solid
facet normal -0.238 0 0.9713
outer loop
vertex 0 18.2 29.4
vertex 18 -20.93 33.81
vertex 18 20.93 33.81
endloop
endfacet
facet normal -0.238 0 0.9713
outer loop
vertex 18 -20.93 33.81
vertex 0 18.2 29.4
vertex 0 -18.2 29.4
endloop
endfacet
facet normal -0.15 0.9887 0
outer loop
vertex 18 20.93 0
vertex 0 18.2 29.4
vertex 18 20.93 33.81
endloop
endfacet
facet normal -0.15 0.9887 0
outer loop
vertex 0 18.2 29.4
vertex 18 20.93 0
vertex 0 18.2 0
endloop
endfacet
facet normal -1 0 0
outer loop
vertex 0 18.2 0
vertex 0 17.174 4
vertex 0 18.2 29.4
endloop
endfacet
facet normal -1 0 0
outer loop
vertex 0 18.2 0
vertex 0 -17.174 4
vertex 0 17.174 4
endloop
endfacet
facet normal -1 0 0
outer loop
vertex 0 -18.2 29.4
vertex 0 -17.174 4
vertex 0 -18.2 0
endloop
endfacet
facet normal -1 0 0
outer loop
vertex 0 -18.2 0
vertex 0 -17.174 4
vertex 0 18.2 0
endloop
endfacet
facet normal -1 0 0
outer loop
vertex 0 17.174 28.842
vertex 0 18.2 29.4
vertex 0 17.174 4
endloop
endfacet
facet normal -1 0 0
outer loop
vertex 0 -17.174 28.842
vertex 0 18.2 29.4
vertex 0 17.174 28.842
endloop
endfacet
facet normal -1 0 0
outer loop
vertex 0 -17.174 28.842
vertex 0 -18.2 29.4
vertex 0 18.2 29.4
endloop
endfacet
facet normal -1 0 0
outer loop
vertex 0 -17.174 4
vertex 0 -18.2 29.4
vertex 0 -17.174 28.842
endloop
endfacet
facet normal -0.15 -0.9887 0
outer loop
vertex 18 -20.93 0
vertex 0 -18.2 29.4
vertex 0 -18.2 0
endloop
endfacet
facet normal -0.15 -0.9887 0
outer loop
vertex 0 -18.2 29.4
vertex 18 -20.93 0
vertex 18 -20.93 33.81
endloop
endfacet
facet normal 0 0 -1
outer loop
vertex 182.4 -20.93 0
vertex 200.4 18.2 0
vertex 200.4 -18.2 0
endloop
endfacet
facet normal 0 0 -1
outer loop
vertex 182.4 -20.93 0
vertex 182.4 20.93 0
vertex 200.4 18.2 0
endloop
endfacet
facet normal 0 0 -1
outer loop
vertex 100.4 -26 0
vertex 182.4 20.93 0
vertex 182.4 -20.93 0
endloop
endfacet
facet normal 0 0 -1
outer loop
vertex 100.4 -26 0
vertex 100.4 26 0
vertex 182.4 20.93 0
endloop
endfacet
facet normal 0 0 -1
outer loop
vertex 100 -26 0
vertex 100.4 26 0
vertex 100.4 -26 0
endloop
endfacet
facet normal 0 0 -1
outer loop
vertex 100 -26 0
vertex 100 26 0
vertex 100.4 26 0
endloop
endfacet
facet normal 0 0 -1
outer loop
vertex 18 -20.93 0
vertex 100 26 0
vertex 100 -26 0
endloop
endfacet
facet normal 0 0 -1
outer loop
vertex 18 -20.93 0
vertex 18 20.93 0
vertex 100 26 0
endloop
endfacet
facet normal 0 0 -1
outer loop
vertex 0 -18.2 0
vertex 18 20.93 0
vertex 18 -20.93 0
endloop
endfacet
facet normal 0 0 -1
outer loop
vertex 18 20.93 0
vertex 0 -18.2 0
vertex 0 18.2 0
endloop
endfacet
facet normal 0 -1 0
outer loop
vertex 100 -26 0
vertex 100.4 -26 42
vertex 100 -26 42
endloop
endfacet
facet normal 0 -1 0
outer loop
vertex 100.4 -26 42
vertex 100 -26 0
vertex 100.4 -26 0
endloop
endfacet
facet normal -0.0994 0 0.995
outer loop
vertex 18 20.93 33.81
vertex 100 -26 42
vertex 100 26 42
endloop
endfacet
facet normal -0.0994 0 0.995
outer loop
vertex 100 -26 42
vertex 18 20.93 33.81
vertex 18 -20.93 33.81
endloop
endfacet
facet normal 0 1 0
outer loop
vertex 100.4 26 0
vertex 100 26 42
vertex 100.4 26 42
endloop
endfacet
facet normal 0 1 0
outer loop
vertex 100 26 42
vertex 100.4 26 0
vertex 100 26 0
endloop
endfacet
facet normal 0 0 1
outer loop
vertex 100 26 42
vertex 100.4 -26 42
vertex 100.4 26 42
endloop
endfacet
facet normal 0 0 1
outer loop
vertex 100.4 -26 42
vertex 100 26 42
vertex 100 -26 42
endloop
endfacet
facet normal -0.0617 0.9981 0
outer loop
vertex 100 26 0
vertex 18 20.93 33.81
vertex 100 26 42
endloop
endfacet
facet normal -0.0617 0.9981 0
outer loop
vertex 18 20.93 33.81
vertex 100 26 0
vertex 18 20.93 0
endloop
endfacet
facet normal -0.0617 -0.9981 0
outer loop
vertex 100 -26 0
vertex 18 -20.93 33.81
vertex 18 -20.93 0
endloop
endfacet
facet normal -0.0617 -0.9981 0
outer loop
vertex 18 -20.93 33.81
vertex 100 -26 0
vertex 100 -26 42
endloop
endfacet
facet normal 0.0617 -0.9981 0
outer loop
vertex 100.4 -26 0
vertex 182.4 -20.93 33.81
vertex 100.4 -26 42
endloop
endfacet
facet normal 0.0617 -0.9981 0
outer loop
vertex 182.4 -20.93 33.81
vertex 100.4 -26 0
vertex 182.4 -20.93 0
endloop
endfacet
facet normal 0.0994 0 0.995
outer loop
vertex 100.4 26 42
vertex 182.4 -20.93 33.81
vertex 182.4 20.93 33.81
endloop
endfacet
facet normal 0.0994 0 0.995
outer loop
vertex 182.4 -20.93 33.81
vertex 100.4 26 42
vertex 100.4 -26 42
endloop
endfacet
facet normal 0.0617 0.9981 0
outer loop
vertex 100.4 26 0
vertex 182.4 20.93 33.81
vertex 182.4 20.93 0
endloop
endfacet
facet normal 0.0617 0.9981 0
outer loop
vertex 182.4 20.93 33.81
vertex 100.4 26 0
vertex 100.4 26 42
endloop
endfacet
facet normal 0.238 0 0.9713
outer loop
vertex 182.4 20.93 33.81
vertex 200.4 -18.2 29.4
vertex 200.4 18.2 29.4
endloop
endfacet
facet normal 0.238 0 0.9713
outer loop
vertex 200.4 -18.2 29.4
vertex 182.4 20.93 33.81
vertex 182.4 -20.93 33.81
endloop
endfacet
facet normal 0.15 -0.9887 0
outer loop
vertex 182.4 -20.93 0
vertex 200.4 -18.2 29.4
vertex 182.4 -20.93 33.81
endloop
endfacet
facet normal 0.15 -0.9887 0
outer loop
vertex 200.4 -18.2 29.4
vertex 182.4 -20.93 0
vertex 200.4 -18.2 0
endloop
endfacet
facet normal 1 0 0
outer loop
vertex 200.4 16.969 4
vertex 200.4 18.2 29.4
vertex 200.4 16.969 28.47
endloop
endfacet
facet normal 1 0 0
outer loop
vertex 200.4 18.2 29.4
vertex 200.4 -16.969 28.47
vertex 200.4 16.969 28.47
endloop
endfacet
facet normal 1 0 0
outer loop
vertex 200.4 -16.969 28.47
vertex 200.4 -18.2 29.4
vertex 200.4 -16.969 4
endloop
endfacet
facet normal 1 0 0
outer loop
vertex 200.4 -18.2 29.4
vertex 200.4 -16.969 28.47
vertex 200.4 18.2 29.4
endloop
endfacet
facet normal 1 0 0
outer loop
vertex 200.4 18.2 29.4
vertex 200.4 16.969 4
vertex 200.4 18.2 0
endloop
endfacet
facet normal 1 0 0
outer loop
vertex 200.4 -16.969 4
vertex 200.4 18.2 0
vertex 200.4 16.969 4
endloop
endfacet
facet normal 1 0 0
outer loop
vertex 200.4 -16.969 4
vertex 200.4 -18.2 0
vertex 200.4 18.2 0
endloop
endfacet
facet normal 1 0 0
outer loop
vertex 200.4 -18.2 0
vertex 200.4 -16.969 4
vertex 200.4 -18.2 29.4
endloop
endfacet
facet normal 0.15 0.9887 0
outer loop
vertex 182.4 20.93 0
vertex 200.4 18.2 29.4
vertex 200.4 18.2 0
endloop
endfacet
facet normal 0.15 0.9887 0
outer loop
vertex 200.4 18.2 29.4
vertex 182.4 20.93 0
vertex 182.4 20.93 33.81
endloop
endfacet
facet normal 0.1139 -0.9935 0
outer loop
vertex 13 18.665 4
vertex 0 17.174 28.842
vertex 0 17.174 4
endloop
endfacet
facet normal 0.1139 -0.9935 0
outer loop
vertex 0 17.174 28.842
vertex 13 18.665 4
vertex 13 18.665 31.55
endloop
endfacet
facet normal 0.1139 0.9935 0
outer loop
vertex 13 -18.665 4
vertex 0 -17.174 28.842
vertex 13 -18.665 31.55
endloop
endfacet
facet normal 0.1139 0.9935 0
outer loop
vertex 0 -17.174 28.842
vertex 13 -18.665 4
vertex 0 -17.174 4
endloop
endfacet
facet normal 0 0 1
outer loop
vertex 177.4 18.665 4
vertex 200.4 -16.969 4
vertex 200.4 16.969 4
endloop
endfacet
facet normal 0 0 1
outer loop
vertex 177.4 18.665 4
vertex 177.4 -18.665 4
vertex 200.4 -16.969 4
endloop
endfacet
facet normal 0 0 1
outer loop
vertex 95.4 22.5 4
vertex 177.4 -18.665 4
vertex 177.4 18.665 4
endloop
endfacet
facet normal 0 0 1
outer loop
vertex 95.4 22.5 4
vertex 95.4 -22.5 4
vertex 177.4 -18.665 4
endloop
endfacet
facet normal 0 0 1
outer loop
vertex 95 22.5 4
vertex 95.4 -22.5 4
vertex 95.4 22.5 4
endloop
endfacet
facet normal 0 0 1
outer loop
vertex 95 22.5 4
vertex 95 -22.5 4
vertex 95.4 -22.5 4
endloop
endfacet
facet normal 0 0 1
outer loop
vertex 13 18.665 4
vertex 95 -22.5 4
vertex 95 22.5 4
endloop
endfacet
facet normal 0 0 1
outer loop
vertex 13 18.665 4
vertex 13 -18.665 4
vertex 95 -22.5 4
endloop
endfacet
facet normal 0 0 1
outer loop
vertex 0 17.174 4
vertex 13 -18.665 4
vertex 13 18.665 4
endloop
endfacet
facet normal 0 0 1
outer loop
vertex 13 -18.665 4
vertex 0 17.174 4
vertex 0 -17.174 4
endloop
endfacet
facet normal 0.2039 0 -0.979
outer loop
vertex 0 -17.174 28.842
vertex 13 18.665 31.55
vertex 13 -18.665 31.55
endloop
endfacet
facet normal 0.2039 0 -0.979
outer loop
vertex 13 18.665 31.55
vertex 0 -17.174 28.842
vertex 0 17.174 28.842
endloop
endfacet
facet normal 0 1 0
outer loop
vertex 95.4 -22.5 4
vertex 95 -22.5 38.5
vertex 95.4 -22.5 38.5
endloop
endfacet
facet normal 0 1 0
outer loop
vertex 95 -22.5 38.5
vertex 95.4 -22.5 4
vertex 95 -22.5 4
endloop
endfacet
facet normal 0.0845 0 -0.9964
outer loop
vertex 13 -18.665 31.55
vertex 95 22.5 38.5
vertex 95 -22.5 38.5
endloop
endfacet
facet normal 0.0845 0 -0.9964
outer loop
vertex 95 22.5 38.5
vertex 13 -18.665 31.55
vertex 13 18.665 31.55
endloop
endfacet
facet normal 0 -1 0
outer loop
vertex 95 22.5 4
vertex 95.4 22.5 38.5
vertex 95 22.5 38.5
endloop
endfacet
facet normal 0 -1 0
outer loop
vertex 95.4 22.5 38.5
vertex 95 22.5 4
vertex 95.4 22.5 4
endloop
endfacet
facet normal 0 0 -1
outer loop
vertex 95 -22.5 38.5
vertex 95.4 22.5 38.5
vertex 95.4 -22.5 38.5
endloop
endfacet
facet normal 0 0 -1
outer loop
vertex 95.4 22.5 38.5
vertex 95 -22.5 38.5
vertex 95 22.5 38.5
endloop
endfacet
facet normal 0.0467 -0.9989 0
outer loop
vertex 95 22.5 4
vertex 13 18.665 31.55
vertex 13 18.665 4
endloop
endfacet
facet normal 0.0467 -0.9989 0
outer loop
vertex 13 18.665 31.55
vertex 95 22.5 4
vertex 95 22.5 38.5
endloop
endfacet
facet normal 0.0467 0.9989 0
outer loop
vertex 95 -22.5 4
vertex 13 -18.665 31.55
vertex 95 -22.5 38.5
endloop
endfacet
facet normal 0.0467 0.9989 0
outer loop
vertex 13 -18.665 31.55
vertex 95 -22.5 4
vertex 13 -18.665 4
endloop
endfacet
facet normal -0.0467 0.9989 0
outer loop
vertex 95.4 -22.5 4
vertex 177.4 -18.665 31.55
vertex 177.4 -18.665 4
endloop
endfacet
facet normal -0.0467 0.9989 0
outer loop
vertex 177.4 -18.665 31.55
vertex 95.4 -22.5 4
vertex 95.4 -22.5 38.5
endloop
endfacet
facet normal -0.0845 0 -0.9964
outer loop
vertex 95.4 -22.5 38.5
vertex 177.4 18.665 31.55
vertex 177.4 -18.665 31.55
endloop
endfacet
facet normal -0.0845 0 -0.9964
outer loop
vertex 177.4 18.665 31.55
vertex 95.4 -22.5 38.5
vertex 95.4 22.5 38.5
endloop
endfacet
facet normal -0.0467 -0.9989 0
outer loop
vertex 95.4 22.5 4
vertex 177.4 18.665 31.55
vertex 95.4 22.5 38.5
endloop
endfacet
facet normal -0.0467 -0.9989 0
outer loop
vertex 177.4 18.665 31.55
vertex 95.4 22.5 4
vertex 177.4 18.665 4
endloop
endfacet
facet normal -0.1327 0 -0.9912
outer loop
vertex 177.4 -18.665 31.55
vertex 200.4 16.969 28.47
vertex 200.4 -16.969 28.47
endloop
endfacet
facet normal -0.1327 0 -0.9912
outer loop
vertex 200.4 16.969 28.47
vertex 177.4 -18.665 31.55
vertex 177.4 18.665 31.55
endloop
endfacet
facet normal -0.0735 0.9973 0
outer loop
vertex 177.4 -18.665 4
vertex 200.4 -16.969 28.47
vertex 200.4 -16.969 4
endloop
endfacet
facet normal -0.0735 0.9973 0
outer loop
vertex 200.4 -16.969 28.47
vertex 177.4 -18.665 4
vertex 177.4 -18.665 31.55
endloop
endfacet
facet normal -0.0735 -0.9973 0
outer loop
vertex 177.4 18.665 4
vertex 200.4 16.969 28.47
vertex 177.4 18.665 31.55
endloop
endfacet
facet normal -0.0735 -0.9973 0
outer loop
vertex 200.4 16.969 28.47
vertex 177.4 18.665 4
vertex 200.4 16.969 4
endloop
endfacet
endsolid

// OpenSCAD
$fn = 32;

// ----------------------------------------------------------------------
// Faired channel: 200 x 52 x 42 mm, 3.5 mm walls, faired ends
// ----------------------------------------------------------------------

// --- parameters (mm) ---
length = 200;             // channel length
width = 52;               // channel width at mid length
height = 42;              // channel height at mid length
wall = 3.5;               // side wall thickness
floor_t = 4;              // floor thickness
end_w = 36.4;             // faired end width
end_h = 29.4;             // faired end height

difference() {
  union() {
    hull() {
      translate([0, -18.2, 0]) cube([0.4, 36.4, 29.4]);
      translate([18, -20.93, 0]) cube([0.4, 41.86, 33.81]);
    }
    hull() {
      translate([18, -20.93, 0]) cube([0.4, 41.86, 33.81]);
      translate([100, -26, 0]) cube([0.4, 52, 42]);
    }
    hull() {
      translate([100, -26, 0]) cube([0.4, 52, 42]);
      translate([182, -20.93, 0]) cube([0.4, 41.86, 33.81]);
    }
    hull() {
      translate([182, -20.93, 0]) cube([0.4, 41.86, 33.81]);
      translate([200, -18.2, 0]) cube([0.4, 36.4, 29.4]);
    }
  }
  /* cavity, 5 mm proud of both ends so the ports are cut clean */
  hull() {
    translate([-5, -16.6, 4]) cube([0.4, 33.2, 23.8]);
    translate([13, -18.665, 4]) cube([0.4, 37.33, 27.55]);
  }
  hull() {
    translate([13, -18.665, 4]) cube([0.4, 37.33, 27.55]);
    translate([95, -22.5, 4]) cube([0.4, 45, 34.5]);
  }
  hull() {
    translate([95, -22.5, 4]) cube([0.4, 45, 34.5]);
    translate([177, -18.665, 4]) cube([0.4, 37.33, 27.55]);
  }
  hull() {
    translate([177, -18.665, 4]) cube([0.4, 37.33, 27.55]);
    translate([205, -16.6, 4]) cube([0.4, 33.2, 23.8]);
  }
}
